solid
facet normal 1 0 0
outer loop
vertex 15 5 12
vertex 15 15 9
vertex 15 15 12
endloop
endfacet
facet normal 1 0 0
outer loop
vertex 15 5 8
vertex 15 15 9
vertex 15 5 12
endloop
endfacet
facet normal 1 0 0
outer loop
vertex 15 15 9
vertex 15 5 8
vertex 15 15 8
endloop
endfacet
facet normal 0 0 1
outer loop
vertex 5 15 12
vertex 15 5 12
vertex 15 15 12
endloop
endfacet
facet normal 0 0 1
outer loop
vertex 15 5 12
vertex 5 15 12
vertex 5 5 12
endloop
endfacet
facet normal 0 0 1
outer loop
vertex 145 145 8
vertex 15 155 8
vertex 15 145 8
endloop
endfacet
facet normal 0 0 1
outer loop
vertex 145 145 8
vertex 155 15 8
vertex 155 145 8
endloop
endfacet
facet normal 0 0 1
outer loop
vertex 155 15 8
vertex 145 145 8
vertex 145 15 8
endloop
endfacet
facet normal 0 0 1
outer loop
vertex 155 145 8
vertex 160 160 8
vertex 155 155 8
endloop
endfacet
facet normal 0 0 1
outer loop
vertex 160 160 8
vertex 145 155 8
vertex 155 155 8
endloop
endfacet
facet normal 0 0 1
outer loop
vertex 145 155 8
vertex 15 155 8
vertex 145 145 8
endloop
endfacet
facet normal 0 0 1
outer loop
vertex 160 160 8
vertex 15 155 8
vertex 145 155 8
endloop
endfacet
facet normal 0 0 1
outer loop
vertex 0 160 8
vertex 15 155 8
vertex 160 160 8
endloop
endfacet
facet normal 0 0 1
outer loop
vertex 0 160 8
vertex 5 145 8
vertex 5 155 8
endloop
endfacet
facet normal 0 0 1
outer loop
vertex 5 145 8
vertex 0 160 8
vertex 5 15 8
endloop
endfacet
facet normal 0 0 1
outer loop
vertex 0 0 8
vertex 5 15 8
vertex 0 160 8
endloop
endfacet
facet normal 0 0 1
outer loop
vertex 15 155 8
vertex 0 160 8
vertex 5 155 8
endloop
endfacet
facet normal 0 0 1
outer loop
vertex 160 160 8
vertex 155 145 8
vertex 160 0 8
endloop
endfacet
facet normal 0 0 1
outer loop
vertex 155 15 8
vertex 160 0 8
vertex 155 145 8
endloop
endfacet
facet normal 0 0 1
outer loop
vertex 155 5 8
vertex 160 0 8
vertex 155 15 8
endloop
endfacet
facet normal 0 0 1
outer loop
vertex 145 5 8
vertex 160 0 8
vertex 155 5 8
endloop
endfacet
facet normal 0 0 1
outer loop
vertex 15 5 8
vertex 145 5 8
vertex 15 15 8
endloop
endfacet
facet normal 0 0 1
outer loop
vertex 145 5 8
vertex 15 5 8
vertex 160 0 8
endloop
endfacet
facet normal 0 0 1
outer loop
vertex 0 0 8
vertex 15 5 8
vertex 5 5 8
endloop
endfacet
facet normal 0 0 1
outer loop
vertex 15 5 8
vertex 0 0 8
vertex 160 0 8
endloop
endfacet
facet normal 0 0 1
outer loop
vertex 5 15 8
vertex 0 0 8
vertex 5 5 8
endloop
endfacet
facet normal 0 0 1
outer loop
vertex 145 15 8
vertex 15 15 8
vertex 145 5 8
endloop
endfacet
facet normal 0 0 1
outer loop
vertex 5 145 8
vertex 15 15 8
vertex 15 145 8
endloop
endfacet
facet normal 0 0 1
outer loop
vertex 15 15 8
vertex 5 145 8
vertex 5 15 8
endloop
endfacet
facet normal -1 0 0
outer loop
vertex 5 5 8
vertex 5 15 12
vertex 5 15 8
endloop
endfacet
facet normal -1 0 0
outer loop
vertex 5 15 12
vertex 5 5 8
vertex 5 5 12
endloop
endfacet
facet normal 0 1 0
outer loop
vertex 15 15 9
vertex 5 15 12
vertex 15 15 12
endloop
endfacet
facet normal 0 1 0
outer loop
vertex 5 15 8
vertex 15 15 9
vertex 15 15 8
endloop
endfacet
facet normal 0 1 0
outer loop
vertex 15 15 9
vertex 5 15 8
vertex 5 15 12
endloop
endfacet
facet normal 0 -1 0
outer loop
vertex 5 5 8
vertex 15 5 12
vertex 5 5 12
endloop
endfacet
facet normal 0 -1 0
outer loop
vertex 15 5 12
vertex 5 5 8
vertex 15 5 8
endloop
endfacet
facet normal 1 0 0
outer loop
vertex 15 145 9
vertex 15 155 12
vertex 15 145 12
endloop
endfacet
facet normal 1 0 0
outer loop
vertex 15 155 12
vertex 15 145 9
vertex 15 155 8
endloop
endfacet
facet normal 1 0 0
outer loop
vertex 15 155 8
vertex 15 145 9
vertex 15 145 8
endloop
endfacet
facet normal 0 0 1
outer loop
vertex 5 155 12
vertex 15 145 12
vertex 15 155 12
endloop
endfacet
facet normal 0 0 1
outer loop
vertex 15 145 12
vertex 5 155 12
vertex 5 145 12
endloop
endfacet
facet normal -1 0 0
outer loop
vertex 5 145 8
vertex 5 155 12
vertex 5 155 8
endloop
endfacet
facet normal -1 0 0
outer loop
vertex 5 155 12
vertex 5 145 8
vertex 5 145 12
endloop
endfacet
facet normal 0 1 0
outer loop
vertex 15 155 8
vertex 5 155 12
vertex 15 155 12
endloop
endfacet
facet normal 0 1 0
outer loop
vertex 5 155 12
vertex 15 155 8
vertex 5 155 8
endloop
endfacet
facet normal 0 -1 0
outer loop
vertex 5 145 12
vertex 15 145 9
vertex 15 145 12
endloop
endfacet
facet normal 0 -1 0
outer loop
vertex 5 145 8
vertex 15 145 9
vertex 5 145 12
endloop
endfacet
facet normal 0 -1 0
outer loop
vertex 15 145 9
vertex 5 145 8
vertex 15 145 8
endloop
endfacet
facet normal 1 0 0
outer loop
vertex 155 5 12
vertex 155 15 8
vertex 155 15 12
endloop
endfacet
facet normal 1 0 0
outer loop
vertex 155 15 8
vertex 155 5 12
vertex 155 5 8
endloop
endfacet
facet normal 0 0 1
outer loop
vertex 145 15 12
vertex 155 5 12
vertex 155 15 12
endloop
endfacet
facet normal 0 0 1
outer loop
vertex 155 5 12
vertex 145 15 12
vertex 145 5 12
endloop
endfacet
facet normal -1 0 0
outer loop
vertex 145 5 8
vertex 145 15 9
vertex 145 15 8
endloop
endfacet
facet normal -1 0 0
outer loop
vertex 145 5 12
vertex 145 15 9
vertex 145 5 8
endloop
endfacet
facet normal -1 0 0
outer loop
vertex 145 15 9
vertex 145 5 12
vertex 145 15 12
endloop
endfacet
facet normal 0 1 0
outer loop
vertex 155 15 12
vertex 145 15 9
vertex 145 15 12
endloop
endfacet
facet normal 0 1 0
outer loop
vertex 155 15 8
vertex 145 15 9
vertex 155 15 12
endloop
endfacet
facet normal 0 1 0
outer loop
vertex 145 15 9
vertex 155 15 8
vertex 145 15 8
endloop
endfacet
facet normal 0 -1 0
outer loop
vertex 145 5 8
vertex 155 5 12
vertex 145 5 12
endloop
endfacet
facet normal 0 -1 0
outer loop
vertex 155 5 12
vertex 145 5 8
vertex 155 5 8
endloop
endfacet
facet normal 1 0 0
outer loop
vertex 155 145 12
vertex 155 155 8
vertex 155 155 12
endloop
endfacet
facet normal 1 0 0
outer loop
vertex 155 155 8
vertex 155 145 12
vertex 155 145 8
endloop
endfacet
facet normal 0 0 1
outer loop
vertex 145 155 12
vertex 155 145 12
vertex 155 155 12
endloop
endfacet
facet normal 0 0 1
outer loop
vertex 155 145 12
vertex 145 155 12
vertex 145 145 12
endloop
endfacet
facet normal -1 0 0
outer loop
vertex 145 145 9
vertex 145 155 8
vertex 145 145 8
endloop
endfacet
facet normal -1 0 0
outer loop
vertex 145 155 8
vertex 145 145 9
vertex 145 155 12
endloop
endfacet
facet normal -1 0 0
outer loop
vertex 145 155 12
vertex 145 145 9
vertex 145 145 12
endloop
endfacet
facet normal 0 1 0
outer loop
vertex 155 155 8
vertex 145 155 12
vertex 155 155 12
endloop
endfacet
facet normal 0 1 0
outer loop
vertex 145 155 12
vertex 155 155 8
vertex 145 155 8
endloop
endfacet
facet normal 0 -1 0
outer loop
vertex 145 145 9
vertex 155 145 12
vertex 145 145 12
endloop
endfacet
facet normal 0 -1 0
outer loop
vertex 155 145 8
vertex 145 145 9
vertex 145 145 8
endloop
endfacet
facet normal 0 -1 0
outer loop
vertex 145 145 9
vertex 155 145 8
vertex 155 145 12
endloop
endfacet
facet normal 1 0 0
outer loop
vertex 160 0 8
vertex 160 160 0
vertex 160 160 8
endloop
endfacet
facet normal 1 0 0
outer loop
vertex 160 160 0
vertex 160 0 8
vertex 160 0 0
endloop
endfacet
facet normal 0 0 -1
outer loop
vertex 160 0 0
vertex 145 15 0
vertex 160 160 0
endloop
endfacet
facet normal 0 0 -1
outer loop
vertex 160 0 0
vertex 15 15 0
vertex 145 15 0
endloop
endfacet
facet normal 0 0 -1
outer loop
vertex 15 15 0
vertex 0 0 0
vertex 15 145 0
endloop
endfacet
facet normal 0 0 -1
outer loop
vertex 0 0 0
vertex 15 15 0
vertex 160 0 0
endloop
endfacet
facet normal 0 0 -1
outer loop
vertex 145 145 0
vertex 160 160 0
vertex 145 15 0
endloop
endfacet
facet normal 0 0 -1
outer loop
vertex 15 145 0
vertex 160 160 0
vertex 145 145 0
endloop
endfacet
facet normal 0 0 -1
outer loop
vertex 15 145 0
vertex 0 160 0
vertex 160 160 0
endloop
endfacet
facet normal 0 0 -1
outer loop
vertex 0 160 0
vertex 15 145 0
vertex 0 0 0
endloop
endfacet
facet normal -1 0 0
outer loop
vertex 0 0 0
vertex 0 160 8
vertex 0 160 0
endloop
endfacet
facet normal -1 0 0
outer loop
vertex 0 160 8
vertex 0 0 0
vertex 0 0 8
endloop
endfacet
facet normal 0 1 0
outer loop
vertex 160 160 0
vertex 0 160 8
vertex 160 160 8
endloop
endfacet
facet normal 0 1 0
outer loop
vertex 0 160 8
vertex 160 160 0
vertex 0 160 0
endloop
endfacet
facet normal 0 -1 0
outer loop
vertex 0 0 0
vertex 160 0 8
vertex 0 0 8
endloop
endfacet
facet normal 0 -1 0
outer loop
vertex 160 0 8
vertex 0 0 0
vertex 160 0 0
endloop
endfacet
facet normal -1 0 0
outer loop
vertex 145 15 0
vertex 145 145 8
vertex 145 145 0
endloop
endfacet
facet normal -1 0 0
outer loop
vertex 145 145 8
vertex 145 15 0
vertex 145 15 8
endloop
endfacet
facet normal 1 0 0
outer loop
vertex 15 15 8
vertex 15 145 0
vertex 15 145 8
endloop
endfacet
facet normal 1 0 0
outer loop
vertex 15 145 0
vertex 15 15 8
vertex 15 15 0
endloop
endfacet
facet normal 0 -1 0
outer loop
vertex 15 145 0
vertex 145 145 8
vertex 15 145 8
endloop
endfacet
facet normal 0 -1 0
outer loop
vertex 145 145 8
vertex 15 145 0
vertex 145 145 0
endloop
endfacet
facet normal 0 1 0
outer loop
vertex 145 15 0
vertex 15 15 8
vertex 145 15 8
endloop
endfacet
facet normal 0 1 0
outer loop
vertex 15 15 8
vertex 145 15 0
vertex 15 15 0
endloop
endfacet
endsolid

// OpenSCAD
$fn=64;
module photomask_holder() {
  difference() {
    union() {
      cube([160,160,8]);
      for(x=[5,145]) for(y=[5,145]) translate([x,y,8]) cube([10,10,4]);
    }
    translate([15,15,-1]) cube([130,130,10]);
  }
}
photomask_holder();
